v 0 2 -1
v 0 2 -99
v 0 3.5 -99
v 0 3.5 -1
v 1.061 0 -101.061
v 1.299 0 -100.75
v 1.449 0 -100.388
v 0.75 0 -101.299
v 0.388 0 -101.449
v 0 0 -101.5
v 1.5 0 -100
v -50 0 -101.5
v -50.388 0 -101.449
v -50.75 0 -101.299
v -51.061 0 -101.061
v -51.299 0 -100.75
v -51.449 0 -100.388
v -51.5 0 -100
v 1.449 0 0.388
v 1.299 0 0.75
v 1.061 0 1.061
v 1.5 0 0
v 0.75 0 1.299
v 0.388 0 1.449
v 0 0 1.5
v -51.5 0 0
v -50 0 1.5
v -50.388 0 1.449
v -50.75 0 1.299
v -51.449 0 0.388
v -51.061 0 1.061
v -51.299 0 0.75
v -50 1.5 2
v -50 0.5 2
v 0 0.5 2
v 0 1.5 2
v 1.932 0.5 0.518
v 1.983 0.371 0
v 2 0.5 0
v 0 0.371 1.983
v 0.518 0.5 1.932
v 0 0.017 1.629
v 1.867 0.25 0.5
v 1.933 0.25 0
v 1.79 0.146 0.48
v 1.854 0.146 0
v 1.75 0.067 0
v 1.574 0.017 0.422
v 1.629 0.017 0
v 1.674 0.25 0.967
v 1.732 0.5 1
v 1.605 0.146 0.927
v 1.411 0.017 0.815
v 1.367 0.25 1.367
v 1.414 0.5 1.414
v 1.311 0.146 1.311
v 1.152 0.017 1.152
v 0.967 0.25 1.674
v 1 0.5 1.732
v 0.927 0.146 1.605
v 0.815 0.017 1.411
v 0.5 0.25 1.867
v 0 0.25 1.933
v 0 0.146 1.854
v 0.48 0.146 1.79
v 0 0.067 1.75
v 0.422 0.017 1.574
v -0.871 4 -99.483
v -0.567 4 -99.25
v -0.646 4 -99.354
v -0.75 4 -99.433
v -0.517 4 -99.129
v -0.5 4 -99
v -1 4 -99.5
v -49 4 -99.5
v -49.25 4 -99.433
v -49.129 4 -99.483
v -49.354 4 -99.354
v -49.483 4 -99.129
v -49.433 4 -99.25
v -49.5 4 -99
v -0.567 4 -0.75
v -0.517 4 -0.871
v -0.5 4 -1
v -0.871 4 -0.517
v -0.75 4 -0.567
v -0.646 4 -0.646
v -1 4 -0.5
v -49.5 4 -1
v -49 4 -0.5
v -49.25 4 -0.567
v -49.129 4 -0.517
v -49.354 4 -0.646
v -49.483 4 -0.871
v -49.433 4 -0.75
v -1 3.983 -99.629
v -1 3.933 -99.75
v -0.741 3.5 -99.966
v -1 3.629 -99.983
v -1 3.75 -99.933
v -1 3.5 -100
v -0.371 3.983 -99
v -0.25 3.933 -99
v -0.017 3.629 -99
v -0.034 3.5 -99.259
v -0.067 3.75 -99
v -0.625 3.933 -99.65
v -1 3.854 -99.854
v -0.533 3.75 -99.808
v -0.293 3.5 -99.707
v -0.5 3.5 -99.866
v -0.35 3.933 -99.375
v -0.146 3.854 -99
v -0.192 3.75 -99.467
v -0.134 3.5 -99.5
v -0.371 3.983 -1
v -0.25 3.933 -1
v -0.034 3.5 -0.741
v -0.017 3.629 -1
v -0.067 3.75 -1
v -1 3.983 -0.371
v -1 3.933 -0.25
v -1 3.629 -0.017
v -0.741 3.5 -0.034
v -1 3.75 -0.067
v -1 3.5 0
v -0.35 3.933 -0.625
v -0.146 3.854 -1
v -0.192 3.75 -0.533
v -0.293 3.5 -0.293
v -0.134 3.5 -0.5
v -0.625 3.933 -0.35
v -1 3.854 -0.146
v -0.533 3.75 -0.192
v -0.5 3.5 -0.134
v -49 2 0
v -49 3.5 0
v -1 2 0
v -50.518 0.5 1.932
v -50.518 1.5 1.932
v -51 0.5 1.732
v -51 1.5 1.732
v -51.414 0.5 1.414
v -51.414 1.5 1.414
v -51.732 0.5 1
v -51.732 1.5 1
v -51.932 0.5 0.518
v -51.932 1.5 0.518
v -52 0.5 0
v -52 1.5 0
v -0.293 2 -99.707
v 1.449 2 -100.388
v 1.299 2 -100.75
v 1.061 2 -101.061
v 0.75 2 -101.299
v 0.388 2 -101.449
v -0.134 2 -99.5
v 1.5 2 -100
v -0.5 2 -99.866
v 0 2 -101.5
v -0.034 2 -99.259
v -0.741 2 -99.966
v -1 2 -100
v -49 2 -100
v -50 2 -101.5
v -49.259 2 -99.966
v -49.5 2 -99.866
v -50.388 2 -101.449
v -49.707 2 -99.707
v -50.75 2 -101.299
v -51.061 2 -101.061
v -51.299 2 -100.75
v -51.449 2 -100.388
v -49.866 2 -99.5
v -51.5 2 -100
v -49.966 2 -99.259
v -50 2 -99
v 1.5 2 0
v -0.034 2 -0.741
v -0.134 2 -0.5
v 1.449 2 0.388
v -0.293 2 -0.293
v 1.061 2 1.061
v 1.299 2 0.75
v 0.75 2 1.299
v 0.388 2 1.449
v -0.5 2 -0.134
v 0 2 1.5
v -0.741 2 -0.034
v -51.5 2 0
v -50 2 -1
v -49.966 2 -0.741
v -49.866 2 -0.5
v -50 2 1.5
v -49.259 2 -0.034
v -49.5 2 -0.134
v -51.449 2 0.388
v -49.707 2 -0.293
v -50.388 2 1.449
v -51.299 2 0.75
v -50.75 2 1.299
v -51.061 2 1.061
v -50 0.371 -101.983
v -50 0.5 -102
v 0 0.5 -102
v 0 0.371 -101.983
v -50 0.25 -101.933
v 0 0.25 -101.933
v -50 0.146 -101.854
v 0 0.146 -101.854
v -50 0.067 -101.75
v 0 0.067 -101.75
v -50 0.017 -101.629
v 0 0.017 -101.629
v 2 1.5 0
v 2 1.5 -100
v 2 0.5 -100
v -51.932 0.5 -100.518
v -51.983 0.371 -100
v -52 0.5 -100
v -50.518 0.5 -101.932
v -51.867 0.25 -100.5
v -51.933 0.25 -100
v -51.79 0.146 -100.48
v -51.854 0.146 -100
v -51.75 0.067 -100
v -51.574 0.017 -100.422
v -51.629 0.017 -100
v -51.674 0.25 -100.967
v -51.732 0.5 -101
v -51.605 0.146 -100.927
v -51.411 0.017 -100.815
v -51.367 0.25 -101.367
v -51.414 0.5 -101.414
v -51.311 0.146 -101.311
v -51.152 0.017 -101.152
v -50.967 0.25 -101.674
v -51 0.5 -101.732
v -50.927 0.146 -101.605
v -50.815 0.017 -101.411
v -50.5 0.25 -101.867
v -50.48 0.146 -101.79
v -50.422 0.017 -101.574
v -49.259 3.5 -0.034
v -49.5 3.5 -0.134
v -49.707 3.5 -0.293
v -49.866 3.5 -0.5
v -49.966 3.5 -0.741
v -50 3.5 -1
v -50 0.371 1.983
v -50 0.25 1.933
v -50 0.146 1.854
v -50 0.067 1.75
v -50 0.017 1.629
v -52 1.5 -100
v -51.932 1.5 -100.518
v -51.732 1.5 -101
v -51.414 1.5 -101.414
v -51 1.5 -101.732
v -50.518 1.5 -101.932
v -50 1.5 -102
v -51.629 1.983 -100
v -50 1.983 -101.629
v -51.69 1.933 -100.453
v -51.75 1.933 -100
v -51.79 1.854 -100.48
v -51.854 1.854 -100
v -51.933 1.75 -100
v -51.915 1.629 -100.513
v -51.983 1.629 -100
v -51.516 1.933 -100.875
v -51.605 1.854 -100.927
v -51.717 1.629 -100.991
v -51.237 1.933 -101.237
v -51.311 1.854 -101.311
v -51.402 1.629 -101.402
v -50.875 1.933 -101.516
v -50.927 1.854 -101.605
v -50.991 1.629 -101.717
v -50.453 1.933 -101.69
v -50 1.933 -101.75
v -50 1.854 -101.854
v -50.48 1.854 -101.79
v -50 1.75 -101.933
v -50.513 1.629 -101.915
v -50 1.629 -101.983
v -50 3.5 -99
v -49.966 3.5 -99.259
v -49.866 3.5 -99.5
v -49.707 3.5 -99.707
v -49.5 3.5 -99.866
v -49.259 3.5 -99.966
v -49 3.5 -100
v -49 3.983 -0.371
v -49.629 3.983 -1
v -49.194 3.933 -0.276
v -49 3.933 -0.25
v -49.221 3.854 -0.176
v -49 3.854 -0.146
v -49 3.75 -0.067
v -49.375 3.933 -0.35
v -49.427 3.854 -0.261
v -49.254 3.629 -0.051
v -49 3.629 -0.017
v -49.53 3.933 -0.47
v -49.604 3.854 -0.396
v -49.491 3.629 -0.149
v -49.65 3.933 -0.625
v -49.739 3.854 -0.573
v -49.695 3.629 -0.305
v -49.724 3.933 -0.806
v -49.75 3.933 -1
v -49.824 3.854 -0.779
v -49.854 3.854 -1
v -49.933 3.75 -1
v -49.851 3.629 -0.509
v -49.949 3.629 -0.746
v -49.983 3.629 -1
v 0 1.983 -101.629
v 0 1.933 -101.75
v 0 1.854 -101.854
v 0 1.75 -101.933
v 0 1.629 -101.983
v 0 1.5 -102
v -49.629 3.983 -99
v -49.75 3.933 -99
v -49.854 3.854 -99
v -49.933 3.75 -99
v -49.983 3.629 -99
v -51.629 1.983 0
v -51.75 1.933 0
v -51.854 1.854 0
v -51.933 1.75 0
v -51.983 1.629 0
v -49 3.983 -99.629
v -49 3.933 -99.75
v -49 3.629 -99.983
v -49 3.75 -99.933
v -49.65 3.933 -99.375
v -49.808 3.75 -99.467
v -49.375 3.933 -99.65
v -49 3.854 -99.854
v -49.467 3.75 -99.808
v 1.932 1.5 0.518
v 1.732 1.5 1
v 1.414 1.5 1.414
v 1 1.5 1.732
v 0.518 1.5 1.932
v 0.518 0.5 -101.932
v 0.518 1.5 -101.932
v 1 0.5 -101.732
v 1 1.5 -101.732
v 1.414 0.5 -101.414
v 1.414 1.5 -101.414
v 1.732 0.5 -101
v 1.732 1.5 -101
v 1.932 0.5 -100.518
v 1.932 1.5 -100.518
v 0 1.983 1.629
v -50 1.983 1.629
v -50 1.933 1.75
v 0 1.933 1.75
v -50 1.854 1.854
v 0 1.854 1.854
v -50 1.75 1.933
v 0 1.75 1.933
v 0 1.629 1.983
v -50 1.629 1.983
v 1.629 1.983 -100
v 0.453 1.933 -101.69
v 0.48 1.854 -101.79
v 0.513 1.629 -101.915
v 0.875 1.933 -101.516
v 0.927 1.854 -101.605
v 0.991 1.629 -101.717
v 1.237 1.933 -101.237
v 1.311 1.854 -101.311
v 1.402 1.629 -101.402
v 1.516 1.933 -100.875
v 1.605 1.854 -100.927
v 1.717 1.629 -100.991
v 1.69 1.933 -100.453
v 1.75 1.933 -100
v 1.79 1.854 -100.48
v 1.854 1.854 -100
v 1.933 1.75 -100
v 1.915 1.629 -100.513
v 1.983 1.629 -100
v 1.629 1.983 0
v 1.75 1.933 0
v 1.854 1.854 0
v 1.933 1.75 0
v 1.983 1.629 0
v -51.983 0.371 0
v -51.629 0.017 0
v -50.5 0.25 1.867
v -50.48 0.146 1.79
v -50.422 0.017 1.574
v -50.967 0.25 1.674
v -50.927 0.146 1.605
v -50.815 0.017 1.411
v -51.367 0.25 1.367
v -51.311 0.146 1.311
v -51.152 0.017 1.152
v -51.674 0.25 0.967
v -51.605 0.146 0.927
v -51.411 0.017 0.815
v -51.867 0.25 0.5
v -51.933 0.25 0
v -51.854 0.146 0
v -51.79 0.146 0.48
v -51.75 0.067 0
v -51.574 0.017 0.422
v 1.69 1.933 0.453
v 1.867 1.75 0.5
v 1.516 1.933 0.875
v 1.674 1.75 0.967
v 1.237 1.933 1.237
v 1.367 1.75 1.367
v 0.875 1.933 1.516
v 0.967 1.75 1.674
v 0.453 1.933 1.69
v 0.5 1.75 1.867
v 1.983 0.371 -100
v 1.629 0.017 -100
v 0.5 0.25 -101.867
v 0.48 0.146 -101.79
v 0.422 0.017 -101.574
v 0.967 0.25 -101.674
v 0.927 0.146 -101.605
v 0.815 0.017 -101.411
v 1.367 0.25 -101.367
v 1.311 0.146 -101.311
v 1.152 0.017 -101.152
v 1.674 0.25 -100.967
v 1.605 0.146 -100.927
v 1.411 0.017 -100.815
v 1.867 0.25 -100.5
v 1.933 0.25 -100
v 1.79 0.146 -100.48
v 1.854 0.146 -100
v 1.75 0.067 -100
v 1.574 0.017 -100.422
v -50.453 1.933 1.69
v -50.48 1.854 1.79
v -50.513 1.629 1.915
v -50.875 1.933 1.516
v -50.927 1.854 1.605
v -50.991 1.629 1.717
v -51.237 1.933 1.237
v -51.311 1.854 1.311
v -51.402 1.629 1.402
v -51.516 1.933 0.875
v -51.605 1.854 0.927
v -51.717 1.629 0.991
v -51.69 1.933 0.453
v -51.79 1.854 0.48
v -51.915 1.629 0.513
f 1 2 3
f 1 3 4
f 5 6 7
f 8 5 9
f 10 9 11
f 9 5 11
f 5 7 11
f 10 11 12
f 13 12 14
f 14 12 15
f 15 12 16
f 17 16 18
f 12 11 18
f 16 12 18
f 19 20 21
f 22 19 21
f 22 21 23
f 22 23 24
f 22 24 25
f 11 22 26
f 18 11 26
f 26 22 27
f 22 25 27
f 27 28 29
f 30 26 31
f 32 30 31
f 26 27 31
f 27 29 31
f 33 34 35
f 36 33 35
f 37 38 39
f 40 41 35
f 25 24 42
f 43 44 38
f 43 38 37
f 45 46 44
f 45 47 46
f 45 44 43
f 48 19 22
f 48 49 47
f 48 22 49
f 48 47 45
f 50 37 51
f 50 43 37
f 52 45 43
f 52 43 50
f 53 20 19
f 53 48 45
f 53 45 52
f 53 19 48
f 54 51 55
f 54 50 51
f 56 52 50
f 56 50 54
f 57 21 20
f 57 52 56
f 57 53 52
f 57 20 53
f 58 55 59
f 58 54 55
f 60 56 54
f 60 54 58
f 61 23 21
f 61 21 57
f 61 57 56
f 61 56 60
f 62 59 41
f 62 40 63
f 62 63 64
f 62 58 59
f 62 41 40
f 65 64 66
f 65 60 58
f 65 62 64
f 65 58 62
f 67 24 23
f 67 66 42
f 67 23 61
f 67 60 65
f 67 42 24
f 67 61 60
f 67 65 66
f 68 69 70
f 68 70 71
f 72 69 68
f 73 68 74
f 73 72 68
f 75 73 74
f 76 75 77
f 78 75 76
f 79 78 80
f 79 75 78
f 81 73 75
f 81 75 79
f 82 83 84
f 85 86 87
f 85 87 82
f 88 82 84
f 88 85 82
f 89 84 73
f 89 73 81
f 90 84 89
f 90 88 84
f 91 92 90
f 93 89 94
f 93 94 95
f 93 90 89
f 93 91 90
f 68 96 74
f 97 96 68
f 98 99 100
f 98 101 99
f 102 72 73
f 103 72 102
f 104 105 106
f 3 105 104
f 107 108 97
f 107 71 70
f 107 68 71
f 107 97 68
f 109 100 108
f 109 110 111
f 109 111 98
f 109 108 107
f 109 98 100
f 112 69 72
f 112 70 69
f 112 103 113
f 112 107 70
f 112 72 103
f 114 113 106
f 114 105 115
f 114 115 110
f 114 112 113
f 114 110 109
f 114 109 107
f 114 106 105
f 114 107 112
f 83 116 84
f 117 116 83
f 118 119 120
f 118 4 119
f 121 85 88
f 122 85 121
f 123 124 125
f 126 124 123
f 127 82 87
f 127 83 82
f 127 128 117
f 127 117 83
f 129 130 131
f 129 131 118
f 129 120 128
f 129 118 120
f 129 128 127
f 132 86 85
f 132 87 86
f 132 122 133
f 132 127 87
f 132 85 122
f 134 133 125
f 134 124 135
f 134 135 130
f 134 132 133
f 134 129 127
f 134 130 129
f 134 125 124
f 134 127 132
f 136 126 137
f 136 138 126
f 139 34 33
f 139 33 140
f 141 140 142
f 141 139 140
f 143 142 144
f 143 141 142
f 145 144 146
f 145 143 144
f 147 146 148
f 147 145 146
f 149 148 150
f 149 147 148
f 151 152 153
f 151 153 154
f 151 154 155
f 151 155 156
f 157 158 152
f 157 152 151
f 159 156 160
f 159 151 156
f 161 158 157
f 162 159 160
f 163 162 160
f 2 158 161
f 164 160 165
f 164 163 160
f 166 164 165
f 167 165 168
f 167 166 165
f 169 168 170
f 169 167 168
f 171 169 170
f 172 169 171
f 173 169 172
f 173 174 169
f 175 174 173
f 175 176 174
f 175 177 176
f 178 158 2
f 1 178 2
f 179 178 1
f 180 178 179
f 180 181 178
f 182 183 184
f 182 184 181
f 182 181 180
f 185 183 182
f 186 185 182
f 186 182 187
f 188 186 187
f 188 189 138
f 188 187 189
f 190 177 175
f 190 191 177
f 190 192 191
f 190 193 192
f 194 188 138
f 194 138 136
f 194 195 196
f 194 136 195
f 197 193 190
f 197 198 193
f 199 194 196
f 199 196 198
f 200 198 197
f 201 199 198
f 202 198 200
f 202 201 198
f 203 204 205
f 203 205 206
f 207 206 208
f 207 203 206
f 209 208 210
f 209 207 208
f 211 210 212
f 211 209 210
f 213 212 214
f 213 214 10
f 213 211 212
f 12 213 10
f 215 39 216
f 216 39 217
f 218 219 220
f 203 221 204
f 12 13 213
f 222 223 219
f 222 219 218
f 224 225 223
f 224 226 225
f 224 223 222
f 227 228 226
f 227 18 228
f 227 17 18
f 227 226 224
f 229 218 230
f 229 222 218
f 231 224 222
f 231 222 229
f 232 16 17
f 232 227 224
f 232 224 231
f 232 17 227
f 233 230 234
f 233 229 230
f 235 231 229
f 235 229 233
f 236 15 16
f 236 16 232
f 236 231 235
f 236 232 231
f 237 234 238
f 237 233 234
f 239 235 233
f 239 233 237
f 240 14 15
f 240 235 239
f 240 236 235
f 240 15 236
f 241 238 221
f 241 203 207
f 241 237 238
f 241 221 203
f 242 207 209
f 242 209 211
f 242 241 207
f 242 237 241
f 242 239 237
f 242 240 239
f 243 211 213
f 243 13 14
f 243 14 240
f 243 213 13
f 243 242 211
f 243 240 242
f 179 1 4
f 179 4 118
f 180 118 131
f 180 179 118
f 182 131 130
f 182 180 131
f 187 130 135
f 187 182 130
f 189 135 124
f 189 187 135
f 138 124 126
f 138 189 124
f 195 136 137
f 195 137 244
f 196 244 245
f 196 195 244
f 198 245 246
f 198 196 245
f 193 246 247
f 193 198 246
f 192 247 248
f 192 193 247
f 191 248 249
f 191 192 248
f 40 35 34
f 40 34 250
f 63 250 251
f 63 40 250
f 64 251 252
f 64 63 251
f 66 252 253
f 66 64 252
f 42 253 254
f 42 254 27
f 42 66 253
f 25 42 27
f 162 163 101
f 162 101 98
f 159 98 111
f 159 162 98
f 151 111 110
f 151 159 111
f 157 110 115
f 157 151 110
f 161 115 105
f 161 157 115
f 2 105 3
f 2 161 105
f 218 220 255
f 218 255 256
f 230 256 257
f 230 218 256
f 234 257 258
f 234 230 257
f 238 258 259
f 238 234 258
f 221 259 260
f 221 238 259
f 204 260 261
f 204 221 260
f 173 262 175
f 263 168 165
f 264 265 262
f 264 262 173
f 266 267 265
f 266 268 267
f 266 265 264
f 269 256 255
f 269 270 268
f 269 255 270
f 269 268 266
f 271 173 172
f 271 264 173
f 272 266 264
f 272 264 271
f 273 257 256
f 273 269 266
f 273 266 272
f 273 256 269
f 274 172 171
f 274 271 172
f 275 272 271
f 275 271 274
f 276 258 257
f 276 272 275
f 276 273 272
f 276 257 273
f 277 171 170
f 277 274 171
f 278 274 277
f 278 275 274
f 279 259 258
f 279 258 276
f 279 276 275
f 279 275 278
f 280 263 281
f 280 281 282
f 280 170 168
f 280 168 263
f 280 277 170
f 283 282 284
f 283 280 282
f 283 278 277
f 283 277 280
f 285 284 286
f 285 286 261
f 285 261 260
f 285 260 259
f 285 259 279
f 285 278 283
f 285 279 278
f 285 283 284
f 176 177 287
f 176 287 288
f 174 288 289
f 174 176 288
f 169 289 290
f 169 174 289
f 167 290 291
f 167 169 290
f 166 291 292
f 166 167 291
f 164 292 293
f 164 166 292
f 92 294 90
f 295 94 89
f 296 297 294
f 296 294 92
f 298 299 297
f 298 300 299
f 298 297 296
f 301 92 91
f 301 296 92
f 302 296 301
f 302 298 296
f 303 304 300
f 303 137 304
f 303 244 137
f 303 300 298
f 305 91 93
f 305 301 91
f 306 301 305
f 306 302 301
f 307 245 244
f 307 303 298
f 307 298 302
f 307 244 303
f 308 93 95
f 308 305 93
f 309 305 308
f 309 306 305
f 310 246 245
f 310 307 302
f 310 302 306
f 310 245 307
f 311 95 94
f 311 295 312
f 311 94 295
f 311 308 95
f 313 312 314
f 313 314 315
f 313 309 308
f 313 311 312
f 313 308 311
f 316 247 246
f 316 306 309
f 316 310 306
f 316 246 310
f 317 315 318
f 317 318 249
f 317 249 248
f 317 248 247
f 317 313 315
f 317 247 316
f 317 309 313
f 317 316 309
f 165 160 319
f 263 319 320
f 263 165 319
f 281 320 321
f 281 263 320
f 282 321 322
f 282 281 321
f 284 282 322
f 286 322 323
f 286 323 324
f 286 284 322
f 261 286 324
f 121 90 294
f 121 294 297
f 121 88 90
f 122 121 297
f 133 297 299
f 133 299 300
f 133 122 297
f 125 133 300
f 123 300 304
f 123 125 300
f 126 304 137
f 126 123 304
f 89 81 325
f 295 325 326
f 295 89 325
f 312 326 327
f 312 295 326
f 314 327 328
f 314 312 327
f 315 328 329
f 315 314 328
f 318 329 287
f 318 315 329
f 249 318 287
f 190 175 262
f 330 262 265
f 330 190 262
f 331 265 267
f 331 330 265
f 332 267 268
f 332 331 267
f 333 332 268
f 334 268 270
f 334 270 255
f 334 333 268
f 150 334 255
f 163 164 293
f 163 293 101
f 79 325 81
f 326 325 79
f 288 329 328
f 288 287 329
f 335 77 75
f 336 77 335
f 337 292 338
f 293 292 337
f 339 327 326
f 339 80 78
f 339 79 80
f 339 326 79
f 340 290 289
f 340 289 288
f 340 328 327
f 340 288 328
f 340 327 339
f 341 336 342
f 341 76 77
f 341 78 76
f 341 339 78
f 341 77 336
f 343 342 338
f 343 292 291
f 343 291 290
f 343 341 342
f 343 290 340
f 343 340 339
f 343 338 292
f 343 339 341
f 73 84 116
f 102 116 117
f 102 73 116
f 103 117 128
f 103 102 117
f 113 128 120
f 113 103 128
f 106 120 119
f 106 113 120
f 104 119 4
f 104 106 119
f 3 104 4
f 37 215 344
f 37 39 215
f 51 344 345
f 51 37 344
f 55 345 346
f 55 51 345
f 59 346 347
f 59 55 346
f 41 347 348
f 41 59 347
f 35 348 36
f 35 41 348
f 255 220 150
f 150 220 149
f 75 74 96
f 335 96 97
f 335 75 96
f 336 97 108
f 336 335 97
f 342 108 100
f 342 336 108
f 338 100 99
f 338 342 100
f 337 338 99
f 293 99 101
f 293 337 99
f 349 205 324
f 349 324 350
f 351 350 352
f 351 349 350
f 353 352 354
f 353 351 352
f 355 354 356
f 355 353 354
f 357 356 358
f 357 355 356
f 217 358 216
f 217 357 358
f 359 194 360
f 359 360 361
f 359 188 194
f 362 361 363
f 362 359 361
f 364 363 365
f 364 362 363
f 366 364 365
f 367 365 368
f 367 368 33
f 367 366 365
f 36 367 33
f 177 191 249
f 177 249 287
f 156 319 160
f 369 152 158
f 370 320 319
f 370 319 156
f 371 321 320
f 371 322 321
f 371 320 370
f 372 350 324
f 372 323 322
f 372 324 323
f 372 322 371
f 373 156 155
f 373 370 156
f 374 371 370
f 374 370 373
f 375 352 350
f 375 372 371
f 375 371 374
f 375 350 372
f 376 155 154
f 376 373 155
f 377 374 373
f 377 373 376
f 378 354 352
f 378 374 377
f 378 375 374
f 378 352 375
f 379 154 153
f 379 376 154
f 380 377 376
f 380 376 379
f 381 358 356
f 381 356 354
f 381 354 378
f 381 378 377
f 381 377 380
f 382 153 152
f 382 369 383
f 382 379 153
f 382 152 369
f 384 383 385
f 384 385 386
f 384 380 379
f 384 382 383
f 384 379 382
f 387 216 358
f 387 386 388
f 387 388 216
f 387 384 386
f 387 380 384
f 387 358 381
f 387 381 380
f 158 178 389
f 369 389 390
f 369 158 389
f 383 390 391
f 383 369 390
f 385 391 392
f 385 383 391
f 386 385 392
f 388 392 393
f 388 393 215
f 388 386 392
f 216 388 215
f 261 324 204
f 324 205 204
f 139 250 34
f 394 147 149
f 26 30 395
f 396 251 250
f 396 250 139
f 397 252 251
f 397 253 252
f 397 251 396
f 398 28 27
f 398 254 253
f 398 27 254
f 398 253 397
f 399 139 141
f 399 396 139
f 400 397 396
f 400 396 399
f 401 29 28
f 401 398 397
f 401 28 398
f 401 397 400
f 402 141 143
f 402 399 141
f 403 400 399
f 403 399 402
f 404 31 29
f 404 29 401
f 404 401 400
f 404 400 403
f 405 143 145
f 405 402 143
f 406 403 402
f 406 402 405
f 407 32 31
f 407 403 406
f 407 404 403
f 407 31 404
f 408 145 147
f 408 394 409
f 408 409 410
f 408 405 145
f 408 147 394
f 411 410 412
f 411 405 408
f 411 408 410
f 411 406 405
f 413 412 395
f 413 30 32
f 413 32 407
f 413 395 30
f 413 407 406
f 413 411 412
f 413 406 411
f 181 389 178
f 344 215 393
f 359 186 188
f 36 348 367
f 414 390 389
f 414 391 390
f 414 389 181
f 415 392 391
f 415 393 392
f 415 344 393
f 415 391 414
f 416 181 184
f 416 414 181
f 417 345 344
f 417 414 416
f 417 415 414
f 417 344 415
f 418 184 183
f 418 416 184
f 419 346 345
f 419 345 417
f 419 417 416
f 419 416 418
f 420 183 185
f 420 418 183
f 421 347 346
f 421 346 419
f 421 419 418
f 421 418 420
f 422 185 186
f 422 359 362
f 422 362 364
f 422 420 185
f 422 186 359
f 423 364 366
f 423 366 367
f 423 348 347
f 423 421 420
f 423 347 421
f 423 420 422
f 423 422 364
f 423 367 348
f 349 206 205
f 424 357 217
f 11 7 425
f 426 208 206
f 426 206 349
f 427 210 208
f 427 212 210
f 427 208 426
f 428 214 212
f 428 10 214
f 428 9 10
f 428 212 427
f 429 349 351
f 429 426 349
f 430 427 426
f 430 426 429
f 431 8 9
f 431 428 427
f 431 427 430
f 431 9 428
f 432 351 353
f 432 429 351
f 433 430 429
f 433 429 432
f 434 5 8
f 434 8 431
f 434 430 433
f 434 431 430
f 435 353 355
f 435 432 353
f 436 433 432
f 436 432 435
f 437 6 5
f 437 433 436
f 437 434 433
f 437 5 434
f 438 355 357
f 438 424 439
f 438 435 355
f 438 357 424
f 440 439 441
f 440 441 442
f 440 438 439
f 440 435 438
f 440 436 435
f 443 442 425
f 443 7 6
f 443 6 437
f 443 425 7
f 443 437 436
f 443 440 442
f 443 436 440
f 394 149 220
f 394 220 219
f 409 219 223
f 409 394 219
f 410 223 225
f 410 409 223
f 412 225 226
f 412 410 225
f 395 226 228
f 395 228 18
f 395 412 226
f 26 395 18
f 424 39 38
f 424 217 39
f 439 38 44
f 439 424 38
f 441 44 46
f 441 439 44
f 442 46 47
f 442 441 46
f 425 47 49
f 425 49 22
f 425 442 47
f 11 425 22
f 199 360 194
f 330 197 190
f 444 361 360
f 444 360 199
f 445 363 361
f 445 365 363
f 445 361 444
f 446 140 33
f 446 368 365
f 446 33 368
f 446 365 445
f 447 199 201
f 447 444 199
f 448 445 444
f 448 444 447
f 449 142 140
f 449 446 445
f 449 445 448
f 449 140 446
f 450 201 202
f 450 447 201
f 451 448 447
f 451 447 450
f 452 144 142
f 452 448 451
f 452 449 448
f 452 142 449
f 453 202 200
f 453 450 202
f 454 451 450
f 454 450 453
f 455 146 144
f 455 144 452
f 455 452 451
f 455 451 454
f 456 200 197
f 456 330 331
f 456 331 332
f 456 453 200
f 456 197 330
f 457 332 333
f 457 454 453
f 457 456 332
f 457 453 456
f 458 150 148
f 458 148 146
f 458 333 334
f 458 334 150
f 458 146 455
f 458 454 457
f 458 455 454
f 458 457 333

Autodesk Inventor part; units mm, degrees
ref_plane "YZ Plane" through (0, 0, 0) normal (1, 0, 0) x (0, 1, 0)
ref_plane "XZ Plane" through (0, 0, 0) normal (0, 1, 0) x (-1, 0, 0)
ref_plane "XY Plane" through (0, 0, 0) normal (0, 0, 1) x (1, 0, 0)
sketch "Sketch1" plane through (0, 0, 0) normal (0, 1, 0) x (-1, 0, 0)
  line L0 (1, 0) -> (49, 0)
  line L1 (50, -1) -> (50, -99)
  line L2 (49, -100) -> (1, -100)
  line L3 (0, -99) -> (0, -1)
  line L4 (50, 2) -> (0, 2)
  line L5 (-2, 0) -> (-2, -100)
  line L6 (0, -102) -> (50, -102)
  line L7 (52, -100) -> (52, 0)
  arc A0 (52, 0) -> (50, 2) centre (50, 0) ccw
  arc A1 (0, 2) -> (-2, 0) centre (0, 0) ccw
  arc A2 (-2, -100) -> (0, -102) centre (0, -100) ccw
  arc A3 (50, -102) -> (52, -100) centre (50, -100) ccw
  arc A4 (50, -1) -> (49, 0) centre (49, -1) ccw
  arc A5 (1, 0) -> (0, -1) centre (1, -1) ccw
  arc A6 (0, -99) -> (1, -100) centre (1, -99) ccw
  arc A7 (49, -100) -> (50, -99) centre (49, -99) ccw
  point P0 (0, 0)
  point P1 (50, -100)
  point P2 (50, 0)
  point P3 (0, -100)
  point P4 (-2, -102)
  point P5 (-2, 2)
  point P6 (52, -102)
  dimension "d0" = 50
  dimension "d1" = 100
  dimension "d2" = 54
  dimension "d3" = 104
  dimension "d4" = 2
  dimension "d5" = 2
  dimension "d6" = 2
  dimension "d7" = 1
extrude "Extrusion1" add sketch "Sketch1" along normal blind 4 contours L0 A4 L1 A7 L2 A6 L3 A5
extrude "Extrusion2" add sketch "Sketch1" along normal blind 2
fillet "Fillet1" radius 0.5 24 edges at (-0.2929, 4, -0.2929) (0, 4, -50) (-0.2929, 4, -99.7071) (-25, 4, -100) (-49.7071, 4, -99.7071) (-50, 4, -50) (-49.7071, 4, -0.2929) (-25, 4, 0) (1.4142, 2, 1.4142) (2, 2, -50) (1.4142, 2, -101.4142) (-25, 2, -102) (-51.4142, 2, -101.4142) (-52, 2, -50) (-51.4142, 2, 1.4142) (-25, 2, 2) (1.4142, 0, 1.4142) (2, 0, -50) (1.4142, 0, -101.4142) (-25, 0, -102) (-51.4142, 0, -101.4142) (-52, 0, -50) (-51.4142, 0, 1.4142) (-25, 0, 2)
properties part number "connection box lid"
